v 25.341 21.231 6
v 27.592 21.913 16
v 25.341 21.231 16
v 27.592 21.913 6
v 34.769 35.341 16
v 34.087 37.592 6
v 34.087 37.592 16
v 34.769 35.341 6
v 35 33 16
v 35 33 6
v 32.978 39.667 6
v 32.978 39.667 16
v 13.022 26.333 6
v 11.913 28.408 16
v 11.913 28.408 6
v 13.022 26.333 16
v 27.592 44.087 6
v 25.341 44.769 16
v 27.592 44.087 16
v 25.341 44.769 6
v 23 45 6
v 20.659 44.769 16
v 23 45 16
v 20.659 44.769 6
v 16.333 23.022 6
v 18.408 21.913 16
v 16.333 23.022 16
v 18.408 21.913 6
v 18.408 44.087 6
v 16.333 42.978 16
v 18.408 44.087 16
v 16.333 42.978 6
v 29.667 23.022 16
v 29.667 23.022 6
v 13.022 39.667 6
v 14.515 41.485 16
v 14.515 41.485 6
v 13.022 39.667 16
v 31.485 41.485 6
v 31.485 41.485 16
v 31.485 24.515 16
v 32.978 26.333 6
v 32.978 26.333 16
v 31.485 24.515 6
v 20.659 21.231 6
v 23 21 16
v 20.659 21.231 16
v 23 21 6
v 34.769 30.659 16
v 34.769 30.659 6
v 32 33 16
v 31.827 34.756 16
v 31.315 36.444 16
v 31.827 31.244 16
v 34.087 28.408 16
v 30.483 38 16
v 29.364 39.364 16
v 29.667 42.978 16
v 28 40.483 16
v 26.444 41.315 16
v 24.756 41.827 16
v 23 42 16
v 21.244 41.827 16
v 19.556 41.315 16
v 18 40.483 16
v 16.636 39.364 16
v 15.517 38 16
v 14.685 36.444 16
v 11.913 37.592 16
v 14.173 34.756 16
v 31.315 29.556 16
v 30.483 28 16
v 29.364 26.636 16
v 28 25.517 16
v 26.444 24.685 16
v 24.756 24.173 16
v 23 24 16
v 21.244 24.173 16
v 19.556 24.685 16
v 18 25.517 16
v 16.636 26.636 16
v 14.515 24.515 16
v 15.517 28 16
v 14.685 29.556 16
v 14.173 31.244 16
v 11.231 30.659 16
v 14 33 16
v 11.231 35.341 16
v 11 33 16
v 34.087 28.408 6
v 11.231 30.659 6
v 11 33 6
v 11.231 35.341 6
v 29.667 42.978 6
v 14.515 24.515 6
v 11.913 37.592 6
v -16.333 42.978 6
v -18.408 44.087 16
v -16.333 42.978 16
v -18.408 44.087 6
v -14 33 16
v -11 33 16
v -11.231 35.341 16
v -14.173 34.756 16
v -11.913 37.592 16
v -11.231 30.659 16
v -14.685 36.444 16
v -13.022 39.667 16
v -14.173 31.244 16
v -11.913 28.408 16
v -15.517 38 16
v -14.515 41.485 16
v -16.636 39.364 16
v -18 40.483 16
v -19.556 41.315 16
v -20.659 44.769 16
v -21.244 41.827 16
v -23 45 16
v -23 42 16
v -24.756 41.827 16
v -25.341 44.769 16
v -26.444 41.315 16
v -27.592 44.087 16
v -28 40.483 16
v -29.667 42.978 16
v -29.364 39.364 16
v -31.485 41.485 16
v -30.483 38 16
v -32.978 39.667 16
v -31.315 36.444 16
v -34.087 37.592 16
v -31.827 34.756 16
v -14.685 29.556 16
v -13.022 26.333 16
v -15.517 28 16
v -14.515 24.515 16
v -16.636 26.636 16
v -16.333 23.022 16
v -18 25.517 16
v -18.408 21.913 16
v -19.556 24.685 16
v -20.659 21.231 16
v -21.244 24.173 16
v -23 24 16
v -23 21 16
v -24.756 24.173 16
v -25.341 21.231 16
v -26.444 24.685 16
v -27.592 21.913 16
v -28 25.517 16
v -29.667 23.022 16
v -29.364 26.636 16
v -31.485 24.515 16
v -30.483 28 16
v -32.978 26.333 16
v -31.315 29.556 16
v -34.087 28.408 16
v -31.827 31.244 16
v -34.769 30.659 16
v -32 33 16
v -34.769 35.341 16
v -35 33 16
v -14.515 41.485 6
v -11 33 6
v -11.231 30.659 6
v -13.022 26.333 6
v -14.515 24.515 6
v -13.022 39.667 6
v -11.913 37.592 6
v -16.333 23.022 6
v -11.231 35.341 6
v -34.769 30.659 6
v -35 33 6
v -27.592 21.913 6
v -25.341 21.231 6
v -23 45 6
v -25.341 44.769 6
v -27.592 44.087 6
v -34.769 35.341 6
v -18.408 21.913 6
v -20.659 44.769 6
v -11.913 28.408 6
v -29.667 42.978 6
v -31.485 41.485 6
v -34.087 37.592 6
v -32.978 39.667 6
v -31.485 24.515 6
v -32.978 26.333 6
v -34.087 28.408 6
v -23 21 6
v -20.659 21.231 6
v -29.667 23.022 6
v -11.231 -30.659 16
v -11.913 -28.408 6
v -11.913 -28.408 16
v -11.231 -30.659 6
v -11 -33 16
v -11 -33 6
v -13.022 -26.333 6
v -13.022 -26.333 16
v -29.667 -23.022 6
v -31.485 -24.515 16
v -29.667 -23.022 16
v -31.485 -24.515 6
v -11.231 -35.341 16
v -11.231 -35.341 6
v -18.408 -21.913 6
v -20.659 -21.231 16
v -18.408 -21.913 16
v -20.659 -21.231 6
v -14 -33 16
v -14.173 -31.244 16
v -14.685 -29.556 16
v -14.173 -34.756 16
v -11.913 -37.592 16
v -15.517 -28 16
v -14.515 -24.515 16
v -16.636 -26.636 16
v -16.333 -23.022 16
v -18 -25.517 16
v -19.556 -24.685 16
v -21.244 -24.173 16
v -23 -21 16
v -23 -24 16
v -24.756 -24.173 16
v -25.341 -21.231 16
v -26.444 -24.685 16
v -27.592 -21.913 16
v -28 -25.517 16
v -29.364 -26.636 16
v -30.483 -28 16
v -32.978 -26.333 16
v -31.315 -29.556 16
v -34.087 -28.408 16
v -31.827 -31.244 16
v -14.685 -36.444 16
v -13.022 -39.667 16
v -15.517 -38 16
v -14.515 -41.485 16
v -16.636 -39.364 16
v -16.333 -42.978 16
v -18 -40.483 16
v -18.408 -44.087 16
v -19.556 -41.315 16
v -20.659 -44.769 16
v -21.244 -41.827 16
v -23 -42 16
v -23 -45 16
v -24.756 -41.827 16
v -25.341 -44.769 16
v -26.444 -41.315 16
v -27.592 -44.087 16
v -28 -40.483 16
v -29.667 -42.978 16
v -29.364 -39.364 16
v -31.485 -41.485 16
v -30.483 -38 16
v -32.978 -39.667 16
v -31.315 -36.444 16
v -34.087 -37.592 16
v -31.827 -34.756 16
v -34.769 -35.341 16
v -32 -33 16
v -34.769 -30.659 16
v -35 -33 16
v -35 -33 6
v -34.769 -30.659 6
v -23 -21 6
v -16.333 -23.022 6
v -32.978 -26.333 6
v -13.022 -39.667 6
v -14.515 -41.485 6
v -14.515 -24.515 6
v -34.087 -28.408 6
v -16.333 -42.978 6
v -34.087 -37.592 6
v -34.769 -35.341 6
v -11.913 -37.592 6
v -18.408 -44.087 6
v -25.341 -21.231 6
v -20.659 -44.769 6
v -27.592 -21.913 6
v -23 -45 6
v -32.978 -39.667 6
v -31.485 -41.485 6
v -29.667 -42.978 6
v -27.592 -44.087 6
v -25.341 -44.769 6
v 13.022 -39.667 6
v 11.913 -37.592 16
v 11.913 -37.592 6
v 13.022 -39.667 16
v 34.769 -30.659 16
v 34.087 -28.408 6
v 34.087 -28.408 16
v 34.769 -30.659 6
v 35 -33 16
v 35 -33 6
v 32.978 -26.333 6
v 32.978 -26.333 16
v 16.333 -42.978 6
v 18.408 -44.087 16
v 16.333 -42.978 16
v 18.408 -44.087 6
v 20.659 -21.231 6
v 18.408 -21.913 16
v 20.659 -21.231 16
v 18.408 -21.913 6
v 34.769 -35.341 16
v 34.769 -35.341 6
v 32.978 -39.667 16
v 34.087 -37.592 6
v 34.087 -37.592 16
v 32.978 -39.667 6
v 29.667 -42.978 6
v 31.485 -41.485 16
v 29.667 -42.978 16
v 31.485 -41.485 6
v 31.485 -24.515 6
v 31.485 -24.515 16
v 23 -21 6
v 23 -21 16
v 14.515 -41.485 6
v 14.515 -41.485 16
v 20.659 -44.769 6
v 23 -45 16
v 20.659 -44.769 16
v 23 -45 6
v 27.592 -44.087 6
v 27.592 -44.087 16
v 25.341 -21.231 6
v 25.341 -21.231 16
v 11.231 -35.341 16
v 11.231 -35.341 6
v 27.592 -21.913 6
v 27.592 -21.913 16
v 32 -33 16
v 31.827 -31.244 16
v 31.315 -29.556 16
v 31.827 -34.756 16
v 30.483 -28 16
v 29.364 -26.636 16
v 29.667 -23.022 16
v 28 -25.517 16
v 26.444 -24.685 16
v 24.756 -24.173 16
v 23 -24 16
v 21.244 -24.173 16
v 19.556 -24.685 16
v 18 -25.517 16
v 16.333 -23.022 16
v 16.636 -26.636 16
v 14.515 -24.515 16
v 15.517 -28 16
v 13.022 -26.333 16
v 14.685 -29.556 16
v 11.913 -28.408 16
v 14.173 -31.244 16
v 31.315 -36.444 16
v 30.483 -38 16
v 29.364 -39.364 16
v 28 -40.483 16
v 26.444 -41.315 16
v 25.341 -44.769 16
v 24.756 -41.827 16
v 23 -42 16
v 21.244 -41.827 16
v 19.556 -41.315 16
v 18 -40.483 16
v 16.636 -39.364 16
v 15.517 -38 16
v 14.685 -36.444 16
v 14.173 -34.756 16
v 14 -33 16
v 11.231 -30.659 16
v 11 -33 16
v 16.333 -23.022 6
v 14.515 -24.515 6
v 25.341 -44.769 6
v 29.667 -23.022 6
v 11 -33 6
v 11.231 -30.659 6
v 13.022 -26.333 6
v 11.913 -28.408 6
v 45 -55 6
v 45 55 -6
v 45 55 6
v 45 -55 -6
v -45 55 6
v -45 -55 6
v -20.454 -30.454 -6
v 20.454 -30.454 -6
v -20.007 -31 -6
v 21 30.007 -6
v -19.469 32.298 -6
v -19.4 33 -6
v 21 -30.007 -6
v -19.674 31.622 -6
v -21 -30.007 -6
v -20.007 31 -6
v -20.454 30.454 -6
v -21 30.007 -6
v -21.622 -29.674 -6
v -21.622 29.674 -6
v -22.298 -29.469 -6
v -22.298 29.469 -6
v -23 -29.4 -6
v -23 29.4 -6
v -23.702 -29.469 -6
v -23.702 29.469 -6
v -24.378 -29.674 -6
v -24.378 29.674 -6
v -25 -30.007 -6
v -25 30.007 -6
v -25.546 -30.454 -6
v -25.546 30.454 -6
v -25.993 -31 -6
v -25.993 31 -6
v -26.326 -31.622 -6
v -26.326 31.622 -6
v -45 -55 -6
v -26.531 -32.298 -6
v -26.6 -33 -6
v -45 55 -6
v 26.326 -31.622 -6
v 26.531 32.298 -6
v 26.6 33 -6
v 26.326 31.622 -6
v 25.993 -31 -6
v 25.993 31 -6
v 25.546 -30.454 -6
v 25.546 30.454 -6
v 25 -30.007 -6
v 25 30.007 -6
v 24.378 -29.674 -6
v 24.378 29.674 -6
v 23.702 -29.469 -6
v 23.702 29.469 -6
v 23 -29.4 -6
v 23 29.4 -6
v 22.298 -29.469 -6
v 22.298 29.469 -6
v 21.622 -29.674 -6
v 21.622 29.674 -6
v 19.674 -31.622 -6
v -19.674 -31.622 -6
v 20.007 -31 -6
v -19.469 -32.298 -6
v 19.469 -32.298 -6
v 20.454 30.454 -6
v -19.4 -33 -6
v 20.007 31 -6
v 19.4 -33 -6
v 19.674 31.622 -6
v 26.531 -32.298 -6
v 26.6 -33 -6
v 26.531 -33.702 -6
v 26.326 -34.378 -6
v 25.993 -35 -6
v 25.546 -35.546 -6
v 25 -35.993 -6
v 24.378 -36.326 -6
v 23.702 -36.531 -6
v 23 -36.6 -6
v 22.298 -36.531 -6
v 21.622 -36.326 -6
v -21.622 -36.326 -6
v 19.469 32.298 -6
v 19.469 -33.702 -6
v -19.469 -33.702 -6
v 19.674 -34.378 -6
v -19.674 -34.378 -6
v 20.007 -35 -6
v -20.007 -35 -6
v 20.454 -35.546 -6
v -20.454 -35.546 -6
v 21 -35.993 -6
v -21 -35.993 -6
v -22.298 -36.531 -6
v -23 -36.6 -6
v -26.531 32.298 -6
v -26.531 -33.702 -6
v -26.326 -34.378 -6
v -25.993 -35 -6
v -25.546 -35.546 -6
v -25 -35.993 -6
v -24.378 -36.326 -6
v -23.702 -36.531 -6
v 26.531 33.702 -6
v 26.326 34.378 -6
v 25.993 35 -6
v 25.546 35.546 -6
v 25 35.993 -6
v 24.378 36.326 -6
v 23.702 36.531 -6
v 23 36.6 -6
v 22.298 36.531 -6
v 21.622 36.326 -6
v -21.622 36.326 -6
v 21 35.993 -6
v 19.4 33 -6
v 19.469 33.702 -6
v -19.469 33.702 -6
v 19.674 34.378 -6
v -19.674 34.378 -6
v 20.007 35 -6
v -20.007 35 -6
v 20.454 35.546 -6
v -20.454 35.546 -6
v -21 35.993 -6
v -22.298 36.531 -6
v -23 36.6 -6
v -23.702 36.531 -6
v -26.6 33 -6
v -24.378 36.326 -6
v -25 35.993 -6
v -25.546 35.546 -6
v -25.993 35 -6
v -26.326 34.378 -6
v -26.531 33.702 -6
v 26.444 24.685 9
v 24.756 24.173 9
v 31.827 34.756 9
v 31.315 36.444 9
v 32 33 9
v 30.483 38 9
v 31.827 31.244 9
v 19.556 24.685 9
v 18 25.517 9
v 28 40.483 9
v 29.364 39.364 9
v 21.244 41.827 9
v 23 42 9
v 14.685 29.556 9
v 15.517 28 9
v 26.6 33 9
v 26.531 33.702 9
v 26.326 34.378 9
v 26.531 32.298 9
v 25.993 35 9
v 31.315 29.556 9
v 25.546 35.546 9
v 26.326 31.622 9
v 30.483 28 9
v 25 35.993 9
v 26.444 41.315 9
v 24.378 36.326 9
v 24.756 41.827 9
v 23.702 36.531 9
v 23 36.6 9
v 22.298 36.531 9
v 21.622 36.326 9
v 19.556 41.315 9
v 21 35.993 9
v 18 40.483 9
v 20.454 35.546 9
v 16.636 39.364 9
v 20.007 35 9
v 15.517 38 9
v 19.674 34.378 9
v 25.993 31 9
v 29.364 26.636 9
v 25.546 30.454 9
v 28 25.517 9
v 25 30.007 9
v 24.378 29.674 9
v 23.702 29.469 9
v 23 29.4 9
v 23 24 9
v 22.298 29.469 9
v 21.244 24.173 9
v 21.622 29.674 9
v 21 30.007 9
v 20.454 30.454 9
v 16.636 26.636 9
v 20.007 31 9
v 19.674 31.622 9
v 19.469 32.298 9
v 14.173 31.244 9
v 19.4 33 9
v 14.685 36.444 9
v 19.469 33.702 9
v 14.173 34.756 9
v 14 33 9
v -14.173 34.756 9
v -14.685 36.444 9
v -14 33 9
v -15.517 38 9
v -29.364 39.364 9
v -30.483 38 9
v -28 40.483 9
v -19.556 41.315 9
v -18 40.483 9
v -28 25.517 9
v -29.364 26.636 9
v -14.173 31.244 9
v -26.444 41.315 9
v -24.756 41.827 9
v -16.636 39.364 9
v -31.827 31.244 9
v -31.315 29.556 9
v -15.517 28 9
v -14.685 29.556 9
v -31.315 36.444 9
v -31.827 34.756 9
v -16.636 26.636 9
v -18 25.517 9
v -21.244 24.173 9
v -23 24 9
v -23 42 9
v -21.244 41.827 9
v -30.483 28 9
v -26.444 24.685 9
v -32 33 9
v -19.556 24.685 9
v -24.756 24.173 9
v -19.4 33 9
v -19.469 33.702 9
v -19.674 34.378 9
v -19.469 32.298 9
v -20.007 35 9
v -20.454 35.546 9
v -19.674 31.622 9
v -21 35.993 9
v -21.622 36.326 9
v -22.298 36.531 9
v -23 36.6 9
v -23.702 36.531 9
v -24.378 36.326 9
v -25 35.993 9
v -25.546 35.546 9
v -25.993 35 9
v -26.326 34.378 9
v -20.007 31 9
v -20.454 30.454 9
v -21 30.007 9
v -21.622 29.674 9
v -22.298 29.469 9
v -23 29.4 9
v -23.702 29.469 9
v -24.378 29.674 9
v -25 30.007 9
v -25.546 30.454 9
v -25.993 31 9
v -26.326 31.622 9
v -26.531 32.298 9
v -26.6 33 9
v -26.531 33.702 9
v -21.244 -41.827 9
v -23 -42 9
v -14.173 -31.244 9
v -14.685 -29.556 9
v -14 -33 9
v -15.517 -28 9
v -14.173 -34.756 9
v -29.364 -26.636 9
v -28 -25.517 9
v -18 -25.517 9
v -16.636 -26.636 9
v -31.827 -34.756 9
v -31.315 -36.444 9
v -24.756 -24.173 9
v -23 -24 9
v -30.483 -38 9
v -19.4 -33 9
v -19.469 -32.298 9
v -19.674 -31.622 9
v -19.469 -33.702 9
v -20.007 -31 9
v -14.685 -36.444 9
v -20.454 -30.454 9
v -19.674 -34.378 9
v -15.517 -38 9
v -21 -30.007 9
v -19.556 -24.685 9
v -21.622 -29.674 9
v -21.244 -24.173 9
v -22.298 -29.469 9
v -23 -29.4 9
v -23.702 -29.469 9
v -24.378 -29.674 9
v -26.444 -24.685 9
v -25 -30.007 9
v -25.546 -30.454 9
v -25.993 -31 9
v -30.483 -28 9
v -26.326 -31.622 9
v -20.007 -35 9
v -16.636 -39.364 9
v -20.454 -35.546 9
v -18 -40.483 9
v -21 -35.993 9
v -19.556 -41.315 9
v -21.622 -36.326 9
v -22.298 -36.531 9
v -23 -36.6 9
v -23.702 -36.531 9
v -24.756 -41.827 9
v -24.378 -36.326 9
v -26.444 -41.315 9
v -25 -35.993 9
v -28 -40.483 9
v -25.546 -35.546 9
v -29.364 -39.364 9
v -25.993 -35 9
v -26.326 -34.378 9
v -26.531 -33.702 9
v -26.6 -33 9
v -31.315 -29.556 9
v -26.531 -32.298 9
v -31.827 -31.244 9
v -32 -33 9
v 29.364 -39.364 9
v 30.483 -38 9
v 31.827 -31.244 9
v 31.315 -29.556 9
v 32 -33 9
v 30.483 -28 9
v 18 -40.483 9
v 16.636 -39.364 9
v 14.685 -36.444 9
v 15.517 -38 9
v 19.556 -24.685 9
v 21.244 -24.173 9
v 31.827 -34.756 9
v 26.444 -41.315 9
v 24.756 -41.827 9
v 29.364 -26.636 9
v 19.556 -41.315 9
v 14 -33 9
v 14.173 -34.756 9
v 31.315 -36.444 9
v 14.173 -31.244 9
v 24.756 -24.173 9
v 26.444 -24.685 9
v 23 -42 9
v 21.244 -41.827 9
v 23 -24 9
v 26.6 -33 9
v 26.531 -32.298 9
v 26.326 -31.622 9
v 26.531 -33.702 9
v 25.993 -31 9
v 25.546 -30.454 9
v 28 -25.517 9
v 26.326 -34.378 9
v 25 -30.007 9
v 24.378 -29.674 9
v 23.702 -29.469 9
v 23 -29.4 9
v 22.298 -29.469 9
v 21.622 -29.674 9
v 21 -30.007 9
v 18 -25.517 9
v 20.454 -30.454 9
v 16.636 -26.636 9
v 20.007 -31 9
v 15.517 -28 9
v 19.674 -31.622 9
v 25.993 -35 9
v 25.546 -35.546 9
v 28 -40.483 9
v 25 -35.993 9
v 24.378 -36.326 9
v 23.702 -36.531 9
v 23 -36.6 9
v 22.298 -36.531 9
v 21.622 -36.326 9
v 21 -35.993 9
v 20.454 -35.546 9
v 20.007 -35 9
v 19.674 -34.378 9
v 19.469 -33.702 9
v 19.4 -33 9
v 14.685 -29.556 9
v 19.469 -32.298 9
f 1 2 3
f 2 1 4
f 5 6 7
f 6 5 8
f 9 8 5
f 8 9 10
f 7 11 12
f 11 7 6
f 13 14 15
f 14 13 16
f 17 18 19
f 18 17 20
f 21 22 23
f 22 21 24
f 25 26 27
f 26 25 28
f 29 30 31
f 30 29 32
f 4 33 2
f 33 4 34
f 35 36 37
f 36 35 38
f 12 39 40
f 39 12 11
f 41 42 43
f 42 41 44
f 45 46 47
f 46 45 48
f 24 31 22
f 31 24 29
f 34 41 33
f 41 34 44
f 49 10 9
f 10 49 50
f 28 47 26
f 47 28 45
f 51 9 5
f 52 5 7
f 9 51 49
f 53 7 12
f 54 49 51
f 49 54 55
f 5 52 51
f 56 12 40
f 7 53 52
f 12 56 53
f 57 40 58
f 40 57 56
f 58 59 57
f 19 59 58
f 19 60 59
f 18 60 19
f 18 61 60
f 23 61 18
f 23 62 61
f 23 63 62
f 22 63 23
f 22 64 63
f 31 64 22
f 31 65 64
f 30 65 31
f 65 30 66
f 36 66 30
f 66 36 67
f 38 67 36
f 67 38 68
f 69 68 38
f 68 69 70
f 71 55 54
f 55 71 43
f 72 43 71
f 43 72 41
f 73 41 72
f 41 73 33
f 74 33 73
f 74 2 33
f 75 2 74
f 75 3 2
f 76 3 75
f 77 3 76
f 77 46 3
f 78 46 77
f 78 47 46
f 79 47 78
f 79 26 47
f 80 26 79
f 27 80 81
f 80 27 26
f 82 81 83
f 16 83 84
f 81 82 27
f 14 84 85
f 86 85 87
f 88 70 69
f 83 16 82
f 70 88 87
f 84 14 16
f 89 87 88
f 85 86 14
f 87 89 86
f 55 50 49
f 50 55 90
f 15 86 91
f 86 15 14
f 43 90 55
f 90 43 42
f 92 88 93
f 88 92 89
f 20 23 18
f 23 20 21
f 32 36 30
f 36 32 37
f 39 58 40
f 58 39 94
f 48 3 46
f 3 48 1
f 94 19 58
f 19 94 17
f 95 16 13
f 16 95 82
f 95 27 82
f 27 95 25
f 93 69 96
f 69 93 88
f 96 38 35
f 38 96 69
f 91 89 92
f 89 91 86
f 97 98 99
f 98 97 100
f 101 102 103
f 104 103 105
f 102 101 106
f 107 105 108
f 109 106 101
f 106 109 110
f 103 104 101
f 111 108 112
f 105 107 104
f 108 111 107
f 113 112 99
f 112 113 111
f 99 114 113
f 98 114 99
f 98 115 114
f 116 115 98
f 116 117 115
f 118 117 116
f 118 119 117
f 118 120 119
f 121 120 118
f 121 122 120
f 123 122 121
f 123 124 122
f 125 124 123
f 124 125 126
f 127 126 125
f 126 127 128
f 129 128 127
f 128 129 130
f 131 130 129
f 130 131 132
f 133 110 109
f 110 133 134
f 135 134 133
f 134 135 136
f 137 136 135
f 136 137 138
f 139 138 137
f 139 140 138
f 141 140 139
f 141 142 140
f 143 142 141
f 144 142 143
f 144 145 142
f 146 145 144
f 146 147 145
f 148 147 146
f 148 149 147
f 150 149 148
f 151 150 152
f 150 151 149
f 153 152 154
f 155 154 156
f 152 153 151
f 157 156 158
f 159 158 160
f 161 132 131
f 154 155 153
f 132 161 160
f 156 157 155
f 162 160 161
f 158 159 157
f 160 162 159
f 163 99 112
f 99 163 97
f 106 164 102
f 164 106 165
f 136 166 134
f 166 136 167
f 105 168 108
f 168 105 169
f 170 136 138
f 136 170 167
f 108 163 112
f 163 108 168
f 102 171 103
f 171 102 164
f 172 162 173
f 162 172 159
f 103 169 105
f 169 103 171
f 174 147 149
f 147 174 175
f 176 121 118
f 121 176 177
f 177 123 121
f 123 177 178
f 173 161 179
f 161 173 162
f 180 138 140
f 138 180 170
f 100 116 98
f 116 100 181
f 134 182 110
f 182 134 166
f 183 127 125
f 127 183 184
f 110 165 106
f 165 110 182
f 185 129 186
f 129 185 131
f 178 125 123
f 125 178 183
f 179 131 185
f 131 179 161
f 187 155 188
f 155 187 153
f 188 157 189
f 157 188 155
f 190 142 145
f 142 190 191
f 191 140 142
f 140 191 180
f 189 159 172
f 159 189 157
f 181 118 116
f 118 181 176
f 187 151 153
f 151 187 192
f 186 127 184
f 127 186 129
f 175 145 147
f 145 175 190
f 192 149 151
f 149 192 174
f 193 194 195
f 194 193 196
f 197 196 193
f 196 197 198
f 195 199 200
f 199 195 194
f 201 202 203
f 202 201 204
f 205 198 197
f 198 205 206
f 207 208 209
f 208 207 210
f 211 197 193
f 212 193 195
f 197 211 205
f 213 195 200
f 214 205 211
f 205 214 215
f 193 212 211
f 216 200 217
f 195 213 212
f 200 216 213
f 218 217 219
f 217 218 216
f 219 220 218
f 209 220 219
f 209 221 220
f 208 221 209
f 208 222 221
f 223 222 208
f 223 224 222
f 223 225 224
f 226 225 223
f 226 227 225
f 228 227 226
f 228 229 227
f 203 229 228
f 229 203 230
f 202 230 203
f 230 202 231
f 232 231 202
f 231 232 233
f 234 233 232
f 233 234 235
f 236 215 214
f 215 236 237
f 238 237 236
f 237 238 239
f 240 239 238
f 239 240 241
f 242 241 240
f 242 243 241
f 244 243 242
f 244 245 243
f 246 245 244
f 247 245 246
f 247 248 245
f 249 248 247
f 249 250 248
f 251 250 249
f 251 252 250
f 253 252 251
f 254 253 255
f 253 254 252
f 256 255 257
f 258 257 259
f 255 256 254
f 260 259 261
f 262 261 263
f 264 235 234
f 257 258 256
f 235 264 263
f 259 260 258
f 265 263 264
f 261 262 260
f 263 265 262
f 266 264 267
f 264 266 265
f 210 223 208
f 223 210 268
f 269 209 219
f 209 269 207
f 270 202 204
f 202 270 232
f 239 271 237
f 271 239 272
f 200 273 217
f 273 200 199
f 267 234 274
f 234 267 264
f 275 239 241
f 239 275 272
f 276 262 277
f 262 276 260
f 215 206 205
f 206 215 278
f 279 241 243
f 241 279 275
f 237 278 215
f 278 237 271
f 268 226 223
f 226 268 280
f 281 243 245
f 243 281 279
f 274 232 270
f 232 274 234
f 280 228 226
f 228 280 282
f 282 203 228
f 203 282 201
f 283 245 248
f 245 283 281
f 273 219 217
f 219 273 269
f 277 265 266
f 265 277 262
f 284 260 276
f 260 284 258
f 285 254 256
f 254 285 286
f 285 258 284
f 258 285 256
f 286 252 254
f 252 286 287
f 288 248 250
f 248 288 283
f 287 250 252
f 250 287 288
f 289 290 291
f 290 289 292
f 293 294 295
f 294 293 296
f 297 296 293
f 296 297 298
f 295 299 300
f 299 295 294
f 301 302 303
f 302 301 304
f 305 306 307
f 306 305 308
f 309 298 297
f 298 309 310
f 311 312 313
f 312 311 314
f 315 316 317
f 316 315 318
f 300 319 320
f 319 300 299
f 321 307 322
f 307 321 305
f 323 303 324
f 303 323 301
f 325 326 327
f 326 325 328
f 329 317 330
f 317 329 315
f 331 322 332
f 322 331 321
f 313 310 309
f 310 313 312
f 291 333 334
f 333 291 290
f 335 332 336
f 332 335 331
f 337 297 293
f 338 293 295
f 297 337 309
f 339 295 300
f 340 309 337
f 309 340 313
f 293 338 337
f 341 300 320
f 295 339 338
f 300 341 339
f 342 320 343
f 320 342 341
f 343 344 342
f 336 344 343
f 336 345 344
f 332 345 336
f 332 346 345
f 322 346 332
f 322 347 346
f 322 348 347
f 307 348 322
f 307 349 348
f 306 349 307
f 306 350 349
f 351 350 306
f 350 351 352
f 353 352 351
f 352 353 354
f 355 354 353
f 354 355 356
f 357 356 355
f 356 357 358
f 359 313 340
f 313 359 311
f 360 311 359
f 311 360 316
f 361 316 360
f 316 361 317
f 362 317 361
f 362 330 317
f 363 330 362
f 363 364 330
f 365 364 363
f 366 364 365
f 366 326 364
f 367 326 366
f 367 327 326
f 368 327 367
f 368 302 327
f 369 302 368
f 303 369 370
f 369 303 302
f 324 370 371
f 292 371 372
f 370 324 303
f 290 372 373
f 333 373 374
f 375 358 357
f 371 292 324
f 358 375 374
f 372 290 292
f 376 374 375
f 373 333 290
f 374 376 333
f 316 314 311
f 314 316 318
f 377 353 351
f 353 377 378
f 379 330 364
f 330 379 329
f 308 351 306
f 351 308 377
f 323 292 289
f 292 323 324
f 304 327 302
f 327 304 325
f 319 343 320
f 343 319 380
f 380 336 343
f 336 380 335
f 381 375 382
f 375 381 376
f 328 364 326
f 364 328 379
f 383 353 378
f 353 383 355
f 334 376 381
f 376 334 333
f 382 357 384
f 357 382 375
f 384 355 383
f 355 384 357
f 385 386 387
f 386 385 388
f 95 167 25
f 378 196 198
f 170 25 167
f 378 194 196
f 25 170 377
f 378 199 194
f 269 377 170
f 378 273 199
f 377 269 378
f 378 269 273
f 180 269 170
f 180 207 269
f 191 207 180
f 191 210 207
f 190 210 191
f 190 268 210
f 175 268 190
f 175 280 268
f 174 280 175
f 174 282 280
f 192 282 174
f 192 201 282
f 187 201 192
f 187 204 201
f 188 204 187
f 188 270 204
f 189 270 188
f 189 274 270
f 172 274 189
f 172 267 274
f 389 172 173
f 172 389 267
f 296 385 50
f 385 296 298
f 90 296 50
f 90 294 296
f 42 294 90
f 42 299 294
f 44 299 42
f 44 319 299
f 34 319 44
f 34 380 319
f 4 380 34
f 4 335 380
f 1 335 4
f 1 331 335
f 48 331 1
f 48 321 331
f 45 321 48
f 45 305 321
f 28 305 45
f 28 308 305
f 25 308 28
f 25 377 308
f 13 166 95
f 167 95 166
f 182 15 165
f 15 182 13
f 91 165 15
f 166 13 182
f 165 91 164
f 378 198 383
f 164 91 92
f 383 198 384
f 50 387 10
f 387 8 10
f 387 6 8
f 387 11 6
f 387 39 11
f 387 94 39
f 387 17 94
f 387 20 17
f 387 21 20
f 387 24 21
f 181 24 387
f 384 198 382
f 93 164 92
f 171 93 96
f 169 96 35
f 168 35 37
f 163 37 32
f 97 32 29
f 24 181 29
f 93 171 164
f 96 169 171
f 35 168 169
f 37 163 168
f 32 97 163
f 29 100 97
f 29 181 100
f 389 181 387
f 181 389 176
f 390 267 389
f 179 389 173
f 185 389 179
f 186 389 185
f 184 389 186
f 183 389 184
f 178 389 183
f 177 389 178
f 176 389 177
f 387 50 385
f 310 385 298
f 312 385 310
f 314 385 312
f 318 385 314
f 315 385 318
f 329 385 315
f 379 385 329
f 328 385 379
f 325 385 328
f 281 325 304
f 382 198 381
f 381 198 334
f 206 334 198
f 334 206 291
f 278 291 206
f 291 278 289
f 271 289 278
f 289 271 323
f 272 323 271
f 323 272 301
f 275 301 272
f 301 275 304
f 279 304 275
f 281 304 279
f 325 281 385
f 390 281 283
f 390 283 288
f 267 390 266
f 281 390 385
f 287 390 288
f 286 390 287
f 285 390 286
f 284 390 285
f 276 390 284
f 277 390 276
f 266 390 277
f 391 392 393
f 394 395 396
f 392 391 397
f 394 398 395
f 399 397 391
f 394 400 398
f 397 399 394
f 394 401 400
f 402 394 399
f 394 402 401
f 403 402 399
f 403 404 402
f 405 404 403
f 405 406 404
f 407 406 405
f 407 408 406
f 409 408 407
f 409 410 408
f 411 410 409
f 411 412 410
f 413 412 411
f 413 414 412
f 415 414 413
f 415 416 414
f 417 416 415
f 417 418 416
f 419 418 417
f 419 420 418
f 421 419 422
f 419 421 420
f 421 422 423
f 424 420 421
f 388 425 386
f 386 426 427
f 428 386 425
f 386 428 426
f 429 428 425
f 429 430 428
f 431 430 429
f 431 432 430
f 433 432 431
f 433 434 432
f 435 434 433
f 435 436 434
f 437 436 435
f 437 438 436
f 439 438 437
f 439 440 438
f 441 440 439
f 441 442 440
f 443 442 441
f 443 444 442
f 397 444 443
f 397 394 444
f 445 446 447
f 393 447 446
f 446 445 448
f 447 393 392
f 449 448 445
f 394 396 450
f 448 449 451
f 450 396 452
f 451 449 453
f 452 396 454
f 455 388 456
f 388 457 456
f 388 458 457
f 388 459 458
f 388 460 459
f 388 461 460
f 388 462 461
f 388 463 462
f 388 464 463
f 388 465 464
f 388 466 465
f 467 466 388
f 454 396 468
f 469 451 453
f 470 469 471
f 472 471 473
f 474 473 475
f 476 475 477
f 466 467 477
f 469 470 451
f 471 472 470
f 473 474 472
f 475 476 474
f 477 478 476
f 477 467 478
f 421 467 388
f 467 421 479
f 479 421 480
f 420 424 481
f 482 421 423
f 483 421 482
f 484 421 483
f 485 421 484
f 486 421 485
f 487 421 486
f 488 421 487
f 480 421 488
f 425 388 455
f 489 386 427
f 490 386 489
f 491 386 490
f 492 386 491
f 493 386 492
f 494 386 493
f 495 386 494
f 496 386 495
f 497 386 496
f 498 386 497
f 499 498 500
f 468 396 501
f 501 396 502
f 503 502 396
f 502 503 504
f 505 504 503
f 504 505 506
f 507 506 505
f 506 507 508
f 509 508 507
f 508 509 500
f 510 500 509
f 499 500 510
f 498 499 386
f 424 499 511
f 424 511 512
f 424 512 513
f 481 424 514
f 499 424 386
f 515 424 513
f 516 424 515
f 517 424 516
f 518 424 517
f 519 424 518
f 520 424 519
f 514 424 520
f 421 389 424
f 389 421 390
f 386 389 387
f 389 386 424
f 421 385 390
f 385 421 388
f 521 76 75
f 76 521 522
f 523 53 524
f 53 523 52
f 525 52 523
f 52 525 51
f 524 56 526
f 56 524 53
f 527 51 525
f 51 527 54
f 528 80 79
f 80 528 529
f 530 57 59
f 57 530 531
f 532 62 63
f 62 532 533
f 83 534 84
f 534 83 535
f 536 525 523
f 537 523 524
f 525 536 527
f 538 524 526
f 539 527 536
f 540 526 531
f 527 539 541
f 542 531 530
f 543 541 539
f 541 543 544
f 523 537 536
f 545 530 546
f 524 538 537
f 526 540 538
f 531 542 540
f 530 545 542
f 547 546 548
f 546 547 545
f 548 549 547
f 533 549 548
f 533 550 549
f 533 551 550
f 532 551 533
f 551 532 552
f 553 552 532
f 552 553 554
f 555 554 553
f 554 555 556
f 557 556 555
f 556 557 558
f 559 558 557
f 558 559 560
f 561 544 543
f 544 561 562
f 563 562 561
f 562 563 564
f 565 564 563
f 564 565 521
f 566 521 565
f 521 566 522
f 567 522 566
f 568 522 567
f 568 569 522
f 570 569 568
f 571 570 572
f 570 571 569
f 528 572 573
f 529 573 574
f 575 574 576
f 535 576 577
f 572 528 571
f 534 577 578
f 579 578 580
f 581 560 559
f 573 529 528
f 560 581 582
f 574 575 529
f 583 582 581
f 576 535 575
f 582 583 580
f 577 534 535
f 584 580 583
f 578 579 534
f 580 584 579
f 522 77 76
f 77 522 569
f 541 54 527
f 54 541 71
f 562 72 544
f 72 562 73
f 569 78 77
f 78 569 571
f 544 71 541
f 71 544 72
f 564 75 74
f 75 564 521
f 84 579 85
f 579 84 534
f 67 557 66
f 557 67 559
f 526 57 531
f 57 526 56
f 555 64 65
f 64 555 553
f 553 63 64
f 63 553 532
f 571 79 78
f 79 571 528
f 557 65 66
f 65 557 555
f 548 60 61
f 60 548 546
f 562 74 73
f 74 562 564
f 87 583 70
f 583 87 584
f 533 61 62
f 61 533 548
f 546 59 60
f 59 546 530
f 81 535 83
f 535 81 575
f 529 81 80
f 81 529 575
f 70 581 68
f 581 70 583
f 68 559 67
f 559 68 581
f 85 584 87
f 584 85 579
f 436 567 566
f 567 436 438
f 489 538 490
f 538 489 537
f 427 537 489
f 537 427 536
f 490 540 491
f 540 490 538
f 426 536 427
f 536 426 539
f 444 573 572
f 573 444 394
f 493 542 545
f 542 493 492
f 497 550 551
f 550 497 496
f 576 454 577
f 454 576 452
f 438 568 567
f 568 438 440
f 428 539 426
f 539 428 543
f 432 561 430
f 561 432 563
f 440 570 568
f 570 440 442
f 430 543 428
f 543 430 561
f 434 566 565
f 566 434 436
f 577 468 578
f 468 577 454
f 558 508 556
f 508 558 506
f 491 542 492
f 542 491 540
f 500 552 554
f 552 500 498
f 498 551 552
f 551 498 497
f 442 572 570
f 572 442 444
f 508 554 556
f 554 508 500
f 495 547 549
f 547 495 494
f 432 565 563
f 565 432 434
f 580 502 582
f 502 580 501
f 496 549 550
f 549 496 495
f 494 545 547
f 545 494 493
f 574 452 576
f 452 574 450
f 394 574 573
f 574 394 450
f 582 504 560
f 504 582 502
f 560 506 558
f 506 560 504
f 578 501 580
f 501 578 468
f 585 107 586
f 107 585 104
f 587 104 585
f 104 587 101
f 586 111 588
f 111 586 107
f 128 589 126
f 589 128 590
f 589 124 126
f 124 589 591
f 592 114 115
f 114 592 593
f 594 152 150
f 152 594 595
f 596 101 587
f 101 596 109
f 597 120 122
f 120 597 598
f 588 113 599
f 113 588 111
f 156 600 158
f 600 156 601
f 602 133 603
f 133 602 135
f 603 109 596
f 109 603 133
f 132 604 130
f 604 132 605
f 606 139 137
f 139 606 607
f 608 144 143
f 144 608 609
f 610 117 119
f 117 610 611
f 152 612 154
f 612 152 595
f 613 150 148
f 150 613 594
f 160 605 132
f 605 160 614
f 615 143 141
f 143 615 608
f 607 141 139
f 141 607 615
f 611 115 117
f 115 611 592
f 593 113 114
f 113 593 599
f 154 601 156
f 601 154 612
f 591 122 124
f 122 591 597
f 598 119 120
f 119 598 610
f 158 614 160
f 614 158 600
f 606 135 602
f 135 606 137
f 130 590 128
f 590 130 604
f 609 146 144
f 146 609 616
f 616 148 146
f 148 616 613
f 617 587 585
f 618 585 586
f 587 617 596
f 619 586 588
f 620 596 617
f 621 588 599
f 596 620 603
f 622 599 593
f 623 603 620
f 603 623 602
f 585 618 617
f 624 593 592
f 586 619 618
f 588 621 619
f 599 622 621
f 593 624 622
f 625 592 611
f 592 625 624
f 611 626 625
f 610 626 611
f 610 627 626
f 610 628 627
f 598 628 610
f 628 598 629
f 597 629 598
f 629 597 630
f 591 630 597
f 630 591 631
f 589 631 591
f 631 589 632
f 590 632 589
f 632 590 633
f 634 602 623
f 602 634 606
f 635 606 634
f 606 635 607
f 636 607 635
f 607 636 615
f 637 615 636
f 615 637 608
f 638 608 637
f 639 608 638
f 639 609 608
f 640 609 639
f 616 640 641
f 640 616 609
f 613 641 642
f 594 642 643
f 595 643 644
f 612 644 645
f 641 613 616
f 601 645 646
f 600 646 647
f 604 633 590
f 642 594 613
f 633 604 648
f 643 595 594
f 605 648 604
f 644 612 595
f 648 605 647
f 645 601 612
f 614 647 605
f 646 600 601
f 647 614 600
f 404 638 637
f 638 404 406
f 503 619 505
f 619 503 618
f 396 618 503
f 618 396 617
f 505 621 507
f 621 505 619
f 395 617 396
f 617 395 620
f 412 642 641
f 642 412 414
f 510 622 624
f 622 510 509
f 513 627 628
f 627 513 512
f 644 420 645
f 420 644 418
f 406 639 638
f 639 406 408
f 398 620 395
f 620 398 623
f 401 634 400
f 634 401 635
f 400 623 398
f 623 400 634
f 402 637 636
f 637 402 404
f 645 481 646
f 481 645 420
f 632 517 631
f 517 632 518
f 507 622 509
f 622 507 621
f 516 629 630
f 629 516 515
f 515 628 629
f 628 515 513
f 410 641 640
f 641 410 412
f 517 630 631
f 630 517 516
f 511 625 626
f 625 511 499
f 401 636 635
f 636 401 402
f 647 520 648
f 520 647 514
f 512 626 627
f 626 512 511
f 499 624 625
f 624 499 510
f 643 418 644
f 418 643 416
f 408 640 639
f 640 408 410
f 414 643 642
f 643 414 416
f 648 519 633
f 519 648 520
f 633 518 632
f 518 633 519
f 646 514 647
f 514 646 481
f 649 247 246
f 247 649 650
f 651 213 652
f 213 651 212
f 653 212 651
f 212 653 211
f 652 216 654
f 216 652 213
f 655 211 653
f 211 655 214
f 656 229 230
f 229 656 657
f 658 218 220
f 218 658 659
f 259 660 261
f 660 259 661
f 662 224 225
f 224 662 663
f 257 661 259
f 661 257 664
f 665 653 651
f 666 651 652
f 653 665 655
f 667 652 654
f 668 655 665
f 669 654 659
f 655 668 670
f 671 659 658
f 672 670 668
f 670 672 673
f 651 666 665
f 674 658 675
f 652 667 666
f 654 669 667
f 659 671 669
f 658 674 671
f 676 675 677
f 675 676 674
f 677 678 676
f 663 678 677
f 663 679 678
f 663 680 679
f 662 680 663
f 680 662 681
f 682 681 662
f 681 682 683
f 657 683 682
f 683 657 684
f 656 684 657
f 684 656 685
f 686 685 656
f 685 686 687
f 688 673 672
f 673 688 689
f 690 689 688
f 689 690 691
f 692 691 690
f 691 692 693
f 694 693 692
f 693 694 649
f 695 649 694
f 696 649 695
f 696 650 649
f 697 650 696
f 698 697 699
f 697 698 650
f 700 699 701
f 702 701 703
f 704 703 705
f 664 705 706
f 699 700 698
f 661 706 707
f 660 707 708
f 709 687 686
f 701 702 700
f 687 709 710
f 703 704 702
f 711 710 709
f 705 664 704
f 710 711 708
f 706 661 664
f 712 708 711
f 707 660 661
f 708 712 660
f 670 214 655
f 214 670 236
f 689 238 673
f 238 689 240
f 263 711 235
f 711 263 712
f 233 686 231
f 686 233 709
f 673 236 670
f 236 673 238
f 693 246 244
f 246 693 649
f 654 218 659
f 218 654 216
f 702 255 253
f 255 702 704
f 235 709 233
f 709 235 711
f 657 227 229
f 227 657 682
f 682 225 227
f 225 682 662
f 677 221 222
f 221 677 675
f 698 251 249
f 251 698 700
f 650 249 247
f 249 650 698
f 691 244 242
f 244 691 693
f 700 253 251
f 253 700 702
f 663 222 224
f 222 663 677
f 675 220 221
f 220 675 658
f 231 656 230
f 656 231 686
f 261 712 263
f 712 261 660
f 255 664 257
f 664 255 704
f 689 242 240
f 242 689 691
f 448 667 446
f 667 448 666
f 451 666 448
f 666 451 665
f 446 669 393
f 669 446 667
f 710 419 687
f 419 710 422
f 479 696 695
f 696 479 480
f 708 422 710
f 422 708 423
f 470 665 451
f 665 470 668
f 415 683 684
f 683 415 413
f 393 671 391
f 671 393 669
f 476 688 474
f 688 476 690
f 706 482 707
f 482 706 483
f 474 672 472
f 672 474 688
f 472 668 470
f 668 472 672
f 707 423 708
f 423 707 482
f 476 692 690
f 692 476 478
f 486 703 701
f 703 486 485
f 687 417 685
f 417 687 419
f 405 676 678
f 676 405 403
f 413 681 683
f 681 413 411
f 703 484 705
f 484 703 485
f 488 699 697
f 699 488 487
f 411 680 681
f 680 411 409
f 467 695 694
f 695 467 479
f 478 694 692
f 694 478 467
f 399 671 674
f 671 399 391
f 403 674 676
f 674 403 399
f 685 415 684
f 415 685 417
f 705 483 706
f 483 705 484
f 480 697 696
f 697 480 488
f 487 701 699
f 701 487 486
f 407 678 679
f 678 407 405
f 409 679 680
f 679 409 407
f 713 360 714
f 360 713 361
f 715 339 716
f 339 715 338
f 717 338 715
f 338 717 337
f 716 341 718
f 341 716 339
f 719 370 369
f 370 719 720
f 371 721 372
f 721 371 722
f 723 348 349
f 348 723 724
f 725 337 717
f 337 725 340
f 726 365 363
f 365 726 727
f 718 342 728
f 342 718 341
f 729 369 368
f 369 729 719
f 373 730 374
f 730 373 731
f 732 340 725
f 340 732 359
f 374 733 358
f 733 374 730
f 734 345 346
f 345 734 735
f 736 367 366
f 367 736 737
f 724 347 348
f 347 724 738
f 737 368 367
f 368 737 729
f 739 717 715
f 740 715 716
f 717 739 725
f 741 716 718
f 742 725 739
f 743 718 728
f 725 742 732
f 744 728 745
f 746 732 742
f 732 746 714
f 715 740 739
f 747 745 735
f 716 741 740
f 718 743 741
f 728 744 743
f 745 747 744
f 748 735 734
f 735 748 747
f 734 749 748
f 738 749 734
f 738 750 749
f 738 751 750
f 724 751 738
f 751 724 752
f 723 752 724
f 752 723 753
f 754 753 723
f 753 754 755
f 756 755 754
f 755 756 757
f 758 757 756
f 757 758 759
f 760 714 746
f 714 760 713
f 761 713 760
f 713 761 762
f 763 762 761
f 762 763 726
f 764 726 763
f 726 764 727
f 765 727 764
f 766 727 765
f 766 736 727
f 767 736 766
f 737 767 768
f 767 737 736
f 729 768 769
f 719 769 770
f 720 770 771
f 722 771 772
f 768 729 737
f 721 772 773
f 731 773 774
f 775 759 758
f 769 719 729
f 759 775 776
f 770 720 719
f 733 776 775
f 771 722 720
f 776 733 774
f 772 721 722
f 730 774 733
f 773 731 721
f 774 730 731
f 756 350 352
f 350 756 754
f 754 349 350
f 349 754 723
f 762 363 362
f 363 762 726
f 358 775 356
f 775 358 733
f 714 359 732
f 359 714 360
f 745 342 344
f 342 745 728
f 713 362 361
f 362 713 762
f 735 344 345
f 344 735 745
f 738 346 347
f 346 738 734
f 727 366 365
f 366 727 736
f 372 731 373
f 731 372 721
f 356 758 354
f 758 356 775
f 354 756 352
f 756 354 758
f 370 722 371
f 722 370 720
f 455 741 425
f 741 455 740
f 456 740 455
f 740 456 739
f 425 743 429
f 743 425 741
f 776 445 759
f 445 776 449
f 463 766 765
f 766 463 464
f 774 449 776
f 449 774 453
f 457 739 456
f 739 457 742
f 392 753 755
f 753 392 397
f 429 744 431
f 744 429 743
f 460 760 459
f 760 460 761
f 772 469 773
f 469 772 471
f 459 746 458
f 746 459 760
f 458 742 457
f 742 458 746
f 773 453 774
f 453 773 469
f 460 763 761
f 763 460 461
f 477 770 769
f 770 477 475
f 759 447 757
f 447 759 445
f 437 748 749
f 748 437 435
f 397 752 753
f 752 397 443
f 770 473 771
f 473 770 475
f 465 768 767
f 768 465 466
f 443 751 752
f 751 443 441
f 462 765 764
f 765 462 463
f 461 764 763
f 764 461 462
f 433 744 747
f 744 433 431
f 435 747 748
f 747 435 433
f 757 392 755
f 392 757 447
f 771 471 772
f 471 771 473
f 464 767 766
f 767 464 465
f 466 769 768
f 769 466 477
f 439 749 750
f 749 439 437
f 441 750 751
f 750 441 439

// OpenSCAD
$fn = 32;

// ----------------------------------------------------------------------
// Socket pad plate
// bosses with counterbored sockets for the screws
// ----------------------------------------------------------------------

// --- parameters (mm) ---
base_t = 12;            // base plate thickness
boss_h = 10;            // boss height above the base plate
boss_d = 24;            // boss diameter
socket_d = 18;          // socket diameter
socket_depth = 7;       // socket depth from the boss face
bolt_d = 7.2;           // screw clearance hole through the socket floor
plate = [90, 110, 12];  // overall size (x, y, z)
edge = 22;              // boss centre offset from the plate edge
pads = 4;               // boss count, one per corner

// --- derived feature positions (mm) ---
height = base_t + boss_h;        // = 22   overall height of the part
corner_x = plate[0] / 2 - edge;  // = 23   boss centre X
corner_y = plate[1] / 2 - edge;  // = 33   boss centre Y
feature_centers = [
  [corner_x, corner_y],
  [-corner_x, corner_y],
  [-corner_x, -corner_y],
  [corner_x, -corner_y]
];   // boss centres: sockets, holes and the pads themselves are placed from here

// base plate, bosses on feature_centers, socket + through hole in each
difference() {
  union() {
    cube(plate, center = true);
    for (centre = feature_centers)
      translate([centre[0], centre[1], plate[2] / 2 - 1])
        cylinder(d = boss_d, h = boss_h + 1);
  }
  for (centre = feature_centers) {
    translate([centre[0], centre[1], plate[2] / 2 + boss_h - socket_depth])
      cylinder(d = socket_d, h = socket_depth + 1);
    translate([centre[0], centre[1], -height])
      cylinder(d = bolt_d, h = 2 * height + 2);  // through the socket floor
  }
}
